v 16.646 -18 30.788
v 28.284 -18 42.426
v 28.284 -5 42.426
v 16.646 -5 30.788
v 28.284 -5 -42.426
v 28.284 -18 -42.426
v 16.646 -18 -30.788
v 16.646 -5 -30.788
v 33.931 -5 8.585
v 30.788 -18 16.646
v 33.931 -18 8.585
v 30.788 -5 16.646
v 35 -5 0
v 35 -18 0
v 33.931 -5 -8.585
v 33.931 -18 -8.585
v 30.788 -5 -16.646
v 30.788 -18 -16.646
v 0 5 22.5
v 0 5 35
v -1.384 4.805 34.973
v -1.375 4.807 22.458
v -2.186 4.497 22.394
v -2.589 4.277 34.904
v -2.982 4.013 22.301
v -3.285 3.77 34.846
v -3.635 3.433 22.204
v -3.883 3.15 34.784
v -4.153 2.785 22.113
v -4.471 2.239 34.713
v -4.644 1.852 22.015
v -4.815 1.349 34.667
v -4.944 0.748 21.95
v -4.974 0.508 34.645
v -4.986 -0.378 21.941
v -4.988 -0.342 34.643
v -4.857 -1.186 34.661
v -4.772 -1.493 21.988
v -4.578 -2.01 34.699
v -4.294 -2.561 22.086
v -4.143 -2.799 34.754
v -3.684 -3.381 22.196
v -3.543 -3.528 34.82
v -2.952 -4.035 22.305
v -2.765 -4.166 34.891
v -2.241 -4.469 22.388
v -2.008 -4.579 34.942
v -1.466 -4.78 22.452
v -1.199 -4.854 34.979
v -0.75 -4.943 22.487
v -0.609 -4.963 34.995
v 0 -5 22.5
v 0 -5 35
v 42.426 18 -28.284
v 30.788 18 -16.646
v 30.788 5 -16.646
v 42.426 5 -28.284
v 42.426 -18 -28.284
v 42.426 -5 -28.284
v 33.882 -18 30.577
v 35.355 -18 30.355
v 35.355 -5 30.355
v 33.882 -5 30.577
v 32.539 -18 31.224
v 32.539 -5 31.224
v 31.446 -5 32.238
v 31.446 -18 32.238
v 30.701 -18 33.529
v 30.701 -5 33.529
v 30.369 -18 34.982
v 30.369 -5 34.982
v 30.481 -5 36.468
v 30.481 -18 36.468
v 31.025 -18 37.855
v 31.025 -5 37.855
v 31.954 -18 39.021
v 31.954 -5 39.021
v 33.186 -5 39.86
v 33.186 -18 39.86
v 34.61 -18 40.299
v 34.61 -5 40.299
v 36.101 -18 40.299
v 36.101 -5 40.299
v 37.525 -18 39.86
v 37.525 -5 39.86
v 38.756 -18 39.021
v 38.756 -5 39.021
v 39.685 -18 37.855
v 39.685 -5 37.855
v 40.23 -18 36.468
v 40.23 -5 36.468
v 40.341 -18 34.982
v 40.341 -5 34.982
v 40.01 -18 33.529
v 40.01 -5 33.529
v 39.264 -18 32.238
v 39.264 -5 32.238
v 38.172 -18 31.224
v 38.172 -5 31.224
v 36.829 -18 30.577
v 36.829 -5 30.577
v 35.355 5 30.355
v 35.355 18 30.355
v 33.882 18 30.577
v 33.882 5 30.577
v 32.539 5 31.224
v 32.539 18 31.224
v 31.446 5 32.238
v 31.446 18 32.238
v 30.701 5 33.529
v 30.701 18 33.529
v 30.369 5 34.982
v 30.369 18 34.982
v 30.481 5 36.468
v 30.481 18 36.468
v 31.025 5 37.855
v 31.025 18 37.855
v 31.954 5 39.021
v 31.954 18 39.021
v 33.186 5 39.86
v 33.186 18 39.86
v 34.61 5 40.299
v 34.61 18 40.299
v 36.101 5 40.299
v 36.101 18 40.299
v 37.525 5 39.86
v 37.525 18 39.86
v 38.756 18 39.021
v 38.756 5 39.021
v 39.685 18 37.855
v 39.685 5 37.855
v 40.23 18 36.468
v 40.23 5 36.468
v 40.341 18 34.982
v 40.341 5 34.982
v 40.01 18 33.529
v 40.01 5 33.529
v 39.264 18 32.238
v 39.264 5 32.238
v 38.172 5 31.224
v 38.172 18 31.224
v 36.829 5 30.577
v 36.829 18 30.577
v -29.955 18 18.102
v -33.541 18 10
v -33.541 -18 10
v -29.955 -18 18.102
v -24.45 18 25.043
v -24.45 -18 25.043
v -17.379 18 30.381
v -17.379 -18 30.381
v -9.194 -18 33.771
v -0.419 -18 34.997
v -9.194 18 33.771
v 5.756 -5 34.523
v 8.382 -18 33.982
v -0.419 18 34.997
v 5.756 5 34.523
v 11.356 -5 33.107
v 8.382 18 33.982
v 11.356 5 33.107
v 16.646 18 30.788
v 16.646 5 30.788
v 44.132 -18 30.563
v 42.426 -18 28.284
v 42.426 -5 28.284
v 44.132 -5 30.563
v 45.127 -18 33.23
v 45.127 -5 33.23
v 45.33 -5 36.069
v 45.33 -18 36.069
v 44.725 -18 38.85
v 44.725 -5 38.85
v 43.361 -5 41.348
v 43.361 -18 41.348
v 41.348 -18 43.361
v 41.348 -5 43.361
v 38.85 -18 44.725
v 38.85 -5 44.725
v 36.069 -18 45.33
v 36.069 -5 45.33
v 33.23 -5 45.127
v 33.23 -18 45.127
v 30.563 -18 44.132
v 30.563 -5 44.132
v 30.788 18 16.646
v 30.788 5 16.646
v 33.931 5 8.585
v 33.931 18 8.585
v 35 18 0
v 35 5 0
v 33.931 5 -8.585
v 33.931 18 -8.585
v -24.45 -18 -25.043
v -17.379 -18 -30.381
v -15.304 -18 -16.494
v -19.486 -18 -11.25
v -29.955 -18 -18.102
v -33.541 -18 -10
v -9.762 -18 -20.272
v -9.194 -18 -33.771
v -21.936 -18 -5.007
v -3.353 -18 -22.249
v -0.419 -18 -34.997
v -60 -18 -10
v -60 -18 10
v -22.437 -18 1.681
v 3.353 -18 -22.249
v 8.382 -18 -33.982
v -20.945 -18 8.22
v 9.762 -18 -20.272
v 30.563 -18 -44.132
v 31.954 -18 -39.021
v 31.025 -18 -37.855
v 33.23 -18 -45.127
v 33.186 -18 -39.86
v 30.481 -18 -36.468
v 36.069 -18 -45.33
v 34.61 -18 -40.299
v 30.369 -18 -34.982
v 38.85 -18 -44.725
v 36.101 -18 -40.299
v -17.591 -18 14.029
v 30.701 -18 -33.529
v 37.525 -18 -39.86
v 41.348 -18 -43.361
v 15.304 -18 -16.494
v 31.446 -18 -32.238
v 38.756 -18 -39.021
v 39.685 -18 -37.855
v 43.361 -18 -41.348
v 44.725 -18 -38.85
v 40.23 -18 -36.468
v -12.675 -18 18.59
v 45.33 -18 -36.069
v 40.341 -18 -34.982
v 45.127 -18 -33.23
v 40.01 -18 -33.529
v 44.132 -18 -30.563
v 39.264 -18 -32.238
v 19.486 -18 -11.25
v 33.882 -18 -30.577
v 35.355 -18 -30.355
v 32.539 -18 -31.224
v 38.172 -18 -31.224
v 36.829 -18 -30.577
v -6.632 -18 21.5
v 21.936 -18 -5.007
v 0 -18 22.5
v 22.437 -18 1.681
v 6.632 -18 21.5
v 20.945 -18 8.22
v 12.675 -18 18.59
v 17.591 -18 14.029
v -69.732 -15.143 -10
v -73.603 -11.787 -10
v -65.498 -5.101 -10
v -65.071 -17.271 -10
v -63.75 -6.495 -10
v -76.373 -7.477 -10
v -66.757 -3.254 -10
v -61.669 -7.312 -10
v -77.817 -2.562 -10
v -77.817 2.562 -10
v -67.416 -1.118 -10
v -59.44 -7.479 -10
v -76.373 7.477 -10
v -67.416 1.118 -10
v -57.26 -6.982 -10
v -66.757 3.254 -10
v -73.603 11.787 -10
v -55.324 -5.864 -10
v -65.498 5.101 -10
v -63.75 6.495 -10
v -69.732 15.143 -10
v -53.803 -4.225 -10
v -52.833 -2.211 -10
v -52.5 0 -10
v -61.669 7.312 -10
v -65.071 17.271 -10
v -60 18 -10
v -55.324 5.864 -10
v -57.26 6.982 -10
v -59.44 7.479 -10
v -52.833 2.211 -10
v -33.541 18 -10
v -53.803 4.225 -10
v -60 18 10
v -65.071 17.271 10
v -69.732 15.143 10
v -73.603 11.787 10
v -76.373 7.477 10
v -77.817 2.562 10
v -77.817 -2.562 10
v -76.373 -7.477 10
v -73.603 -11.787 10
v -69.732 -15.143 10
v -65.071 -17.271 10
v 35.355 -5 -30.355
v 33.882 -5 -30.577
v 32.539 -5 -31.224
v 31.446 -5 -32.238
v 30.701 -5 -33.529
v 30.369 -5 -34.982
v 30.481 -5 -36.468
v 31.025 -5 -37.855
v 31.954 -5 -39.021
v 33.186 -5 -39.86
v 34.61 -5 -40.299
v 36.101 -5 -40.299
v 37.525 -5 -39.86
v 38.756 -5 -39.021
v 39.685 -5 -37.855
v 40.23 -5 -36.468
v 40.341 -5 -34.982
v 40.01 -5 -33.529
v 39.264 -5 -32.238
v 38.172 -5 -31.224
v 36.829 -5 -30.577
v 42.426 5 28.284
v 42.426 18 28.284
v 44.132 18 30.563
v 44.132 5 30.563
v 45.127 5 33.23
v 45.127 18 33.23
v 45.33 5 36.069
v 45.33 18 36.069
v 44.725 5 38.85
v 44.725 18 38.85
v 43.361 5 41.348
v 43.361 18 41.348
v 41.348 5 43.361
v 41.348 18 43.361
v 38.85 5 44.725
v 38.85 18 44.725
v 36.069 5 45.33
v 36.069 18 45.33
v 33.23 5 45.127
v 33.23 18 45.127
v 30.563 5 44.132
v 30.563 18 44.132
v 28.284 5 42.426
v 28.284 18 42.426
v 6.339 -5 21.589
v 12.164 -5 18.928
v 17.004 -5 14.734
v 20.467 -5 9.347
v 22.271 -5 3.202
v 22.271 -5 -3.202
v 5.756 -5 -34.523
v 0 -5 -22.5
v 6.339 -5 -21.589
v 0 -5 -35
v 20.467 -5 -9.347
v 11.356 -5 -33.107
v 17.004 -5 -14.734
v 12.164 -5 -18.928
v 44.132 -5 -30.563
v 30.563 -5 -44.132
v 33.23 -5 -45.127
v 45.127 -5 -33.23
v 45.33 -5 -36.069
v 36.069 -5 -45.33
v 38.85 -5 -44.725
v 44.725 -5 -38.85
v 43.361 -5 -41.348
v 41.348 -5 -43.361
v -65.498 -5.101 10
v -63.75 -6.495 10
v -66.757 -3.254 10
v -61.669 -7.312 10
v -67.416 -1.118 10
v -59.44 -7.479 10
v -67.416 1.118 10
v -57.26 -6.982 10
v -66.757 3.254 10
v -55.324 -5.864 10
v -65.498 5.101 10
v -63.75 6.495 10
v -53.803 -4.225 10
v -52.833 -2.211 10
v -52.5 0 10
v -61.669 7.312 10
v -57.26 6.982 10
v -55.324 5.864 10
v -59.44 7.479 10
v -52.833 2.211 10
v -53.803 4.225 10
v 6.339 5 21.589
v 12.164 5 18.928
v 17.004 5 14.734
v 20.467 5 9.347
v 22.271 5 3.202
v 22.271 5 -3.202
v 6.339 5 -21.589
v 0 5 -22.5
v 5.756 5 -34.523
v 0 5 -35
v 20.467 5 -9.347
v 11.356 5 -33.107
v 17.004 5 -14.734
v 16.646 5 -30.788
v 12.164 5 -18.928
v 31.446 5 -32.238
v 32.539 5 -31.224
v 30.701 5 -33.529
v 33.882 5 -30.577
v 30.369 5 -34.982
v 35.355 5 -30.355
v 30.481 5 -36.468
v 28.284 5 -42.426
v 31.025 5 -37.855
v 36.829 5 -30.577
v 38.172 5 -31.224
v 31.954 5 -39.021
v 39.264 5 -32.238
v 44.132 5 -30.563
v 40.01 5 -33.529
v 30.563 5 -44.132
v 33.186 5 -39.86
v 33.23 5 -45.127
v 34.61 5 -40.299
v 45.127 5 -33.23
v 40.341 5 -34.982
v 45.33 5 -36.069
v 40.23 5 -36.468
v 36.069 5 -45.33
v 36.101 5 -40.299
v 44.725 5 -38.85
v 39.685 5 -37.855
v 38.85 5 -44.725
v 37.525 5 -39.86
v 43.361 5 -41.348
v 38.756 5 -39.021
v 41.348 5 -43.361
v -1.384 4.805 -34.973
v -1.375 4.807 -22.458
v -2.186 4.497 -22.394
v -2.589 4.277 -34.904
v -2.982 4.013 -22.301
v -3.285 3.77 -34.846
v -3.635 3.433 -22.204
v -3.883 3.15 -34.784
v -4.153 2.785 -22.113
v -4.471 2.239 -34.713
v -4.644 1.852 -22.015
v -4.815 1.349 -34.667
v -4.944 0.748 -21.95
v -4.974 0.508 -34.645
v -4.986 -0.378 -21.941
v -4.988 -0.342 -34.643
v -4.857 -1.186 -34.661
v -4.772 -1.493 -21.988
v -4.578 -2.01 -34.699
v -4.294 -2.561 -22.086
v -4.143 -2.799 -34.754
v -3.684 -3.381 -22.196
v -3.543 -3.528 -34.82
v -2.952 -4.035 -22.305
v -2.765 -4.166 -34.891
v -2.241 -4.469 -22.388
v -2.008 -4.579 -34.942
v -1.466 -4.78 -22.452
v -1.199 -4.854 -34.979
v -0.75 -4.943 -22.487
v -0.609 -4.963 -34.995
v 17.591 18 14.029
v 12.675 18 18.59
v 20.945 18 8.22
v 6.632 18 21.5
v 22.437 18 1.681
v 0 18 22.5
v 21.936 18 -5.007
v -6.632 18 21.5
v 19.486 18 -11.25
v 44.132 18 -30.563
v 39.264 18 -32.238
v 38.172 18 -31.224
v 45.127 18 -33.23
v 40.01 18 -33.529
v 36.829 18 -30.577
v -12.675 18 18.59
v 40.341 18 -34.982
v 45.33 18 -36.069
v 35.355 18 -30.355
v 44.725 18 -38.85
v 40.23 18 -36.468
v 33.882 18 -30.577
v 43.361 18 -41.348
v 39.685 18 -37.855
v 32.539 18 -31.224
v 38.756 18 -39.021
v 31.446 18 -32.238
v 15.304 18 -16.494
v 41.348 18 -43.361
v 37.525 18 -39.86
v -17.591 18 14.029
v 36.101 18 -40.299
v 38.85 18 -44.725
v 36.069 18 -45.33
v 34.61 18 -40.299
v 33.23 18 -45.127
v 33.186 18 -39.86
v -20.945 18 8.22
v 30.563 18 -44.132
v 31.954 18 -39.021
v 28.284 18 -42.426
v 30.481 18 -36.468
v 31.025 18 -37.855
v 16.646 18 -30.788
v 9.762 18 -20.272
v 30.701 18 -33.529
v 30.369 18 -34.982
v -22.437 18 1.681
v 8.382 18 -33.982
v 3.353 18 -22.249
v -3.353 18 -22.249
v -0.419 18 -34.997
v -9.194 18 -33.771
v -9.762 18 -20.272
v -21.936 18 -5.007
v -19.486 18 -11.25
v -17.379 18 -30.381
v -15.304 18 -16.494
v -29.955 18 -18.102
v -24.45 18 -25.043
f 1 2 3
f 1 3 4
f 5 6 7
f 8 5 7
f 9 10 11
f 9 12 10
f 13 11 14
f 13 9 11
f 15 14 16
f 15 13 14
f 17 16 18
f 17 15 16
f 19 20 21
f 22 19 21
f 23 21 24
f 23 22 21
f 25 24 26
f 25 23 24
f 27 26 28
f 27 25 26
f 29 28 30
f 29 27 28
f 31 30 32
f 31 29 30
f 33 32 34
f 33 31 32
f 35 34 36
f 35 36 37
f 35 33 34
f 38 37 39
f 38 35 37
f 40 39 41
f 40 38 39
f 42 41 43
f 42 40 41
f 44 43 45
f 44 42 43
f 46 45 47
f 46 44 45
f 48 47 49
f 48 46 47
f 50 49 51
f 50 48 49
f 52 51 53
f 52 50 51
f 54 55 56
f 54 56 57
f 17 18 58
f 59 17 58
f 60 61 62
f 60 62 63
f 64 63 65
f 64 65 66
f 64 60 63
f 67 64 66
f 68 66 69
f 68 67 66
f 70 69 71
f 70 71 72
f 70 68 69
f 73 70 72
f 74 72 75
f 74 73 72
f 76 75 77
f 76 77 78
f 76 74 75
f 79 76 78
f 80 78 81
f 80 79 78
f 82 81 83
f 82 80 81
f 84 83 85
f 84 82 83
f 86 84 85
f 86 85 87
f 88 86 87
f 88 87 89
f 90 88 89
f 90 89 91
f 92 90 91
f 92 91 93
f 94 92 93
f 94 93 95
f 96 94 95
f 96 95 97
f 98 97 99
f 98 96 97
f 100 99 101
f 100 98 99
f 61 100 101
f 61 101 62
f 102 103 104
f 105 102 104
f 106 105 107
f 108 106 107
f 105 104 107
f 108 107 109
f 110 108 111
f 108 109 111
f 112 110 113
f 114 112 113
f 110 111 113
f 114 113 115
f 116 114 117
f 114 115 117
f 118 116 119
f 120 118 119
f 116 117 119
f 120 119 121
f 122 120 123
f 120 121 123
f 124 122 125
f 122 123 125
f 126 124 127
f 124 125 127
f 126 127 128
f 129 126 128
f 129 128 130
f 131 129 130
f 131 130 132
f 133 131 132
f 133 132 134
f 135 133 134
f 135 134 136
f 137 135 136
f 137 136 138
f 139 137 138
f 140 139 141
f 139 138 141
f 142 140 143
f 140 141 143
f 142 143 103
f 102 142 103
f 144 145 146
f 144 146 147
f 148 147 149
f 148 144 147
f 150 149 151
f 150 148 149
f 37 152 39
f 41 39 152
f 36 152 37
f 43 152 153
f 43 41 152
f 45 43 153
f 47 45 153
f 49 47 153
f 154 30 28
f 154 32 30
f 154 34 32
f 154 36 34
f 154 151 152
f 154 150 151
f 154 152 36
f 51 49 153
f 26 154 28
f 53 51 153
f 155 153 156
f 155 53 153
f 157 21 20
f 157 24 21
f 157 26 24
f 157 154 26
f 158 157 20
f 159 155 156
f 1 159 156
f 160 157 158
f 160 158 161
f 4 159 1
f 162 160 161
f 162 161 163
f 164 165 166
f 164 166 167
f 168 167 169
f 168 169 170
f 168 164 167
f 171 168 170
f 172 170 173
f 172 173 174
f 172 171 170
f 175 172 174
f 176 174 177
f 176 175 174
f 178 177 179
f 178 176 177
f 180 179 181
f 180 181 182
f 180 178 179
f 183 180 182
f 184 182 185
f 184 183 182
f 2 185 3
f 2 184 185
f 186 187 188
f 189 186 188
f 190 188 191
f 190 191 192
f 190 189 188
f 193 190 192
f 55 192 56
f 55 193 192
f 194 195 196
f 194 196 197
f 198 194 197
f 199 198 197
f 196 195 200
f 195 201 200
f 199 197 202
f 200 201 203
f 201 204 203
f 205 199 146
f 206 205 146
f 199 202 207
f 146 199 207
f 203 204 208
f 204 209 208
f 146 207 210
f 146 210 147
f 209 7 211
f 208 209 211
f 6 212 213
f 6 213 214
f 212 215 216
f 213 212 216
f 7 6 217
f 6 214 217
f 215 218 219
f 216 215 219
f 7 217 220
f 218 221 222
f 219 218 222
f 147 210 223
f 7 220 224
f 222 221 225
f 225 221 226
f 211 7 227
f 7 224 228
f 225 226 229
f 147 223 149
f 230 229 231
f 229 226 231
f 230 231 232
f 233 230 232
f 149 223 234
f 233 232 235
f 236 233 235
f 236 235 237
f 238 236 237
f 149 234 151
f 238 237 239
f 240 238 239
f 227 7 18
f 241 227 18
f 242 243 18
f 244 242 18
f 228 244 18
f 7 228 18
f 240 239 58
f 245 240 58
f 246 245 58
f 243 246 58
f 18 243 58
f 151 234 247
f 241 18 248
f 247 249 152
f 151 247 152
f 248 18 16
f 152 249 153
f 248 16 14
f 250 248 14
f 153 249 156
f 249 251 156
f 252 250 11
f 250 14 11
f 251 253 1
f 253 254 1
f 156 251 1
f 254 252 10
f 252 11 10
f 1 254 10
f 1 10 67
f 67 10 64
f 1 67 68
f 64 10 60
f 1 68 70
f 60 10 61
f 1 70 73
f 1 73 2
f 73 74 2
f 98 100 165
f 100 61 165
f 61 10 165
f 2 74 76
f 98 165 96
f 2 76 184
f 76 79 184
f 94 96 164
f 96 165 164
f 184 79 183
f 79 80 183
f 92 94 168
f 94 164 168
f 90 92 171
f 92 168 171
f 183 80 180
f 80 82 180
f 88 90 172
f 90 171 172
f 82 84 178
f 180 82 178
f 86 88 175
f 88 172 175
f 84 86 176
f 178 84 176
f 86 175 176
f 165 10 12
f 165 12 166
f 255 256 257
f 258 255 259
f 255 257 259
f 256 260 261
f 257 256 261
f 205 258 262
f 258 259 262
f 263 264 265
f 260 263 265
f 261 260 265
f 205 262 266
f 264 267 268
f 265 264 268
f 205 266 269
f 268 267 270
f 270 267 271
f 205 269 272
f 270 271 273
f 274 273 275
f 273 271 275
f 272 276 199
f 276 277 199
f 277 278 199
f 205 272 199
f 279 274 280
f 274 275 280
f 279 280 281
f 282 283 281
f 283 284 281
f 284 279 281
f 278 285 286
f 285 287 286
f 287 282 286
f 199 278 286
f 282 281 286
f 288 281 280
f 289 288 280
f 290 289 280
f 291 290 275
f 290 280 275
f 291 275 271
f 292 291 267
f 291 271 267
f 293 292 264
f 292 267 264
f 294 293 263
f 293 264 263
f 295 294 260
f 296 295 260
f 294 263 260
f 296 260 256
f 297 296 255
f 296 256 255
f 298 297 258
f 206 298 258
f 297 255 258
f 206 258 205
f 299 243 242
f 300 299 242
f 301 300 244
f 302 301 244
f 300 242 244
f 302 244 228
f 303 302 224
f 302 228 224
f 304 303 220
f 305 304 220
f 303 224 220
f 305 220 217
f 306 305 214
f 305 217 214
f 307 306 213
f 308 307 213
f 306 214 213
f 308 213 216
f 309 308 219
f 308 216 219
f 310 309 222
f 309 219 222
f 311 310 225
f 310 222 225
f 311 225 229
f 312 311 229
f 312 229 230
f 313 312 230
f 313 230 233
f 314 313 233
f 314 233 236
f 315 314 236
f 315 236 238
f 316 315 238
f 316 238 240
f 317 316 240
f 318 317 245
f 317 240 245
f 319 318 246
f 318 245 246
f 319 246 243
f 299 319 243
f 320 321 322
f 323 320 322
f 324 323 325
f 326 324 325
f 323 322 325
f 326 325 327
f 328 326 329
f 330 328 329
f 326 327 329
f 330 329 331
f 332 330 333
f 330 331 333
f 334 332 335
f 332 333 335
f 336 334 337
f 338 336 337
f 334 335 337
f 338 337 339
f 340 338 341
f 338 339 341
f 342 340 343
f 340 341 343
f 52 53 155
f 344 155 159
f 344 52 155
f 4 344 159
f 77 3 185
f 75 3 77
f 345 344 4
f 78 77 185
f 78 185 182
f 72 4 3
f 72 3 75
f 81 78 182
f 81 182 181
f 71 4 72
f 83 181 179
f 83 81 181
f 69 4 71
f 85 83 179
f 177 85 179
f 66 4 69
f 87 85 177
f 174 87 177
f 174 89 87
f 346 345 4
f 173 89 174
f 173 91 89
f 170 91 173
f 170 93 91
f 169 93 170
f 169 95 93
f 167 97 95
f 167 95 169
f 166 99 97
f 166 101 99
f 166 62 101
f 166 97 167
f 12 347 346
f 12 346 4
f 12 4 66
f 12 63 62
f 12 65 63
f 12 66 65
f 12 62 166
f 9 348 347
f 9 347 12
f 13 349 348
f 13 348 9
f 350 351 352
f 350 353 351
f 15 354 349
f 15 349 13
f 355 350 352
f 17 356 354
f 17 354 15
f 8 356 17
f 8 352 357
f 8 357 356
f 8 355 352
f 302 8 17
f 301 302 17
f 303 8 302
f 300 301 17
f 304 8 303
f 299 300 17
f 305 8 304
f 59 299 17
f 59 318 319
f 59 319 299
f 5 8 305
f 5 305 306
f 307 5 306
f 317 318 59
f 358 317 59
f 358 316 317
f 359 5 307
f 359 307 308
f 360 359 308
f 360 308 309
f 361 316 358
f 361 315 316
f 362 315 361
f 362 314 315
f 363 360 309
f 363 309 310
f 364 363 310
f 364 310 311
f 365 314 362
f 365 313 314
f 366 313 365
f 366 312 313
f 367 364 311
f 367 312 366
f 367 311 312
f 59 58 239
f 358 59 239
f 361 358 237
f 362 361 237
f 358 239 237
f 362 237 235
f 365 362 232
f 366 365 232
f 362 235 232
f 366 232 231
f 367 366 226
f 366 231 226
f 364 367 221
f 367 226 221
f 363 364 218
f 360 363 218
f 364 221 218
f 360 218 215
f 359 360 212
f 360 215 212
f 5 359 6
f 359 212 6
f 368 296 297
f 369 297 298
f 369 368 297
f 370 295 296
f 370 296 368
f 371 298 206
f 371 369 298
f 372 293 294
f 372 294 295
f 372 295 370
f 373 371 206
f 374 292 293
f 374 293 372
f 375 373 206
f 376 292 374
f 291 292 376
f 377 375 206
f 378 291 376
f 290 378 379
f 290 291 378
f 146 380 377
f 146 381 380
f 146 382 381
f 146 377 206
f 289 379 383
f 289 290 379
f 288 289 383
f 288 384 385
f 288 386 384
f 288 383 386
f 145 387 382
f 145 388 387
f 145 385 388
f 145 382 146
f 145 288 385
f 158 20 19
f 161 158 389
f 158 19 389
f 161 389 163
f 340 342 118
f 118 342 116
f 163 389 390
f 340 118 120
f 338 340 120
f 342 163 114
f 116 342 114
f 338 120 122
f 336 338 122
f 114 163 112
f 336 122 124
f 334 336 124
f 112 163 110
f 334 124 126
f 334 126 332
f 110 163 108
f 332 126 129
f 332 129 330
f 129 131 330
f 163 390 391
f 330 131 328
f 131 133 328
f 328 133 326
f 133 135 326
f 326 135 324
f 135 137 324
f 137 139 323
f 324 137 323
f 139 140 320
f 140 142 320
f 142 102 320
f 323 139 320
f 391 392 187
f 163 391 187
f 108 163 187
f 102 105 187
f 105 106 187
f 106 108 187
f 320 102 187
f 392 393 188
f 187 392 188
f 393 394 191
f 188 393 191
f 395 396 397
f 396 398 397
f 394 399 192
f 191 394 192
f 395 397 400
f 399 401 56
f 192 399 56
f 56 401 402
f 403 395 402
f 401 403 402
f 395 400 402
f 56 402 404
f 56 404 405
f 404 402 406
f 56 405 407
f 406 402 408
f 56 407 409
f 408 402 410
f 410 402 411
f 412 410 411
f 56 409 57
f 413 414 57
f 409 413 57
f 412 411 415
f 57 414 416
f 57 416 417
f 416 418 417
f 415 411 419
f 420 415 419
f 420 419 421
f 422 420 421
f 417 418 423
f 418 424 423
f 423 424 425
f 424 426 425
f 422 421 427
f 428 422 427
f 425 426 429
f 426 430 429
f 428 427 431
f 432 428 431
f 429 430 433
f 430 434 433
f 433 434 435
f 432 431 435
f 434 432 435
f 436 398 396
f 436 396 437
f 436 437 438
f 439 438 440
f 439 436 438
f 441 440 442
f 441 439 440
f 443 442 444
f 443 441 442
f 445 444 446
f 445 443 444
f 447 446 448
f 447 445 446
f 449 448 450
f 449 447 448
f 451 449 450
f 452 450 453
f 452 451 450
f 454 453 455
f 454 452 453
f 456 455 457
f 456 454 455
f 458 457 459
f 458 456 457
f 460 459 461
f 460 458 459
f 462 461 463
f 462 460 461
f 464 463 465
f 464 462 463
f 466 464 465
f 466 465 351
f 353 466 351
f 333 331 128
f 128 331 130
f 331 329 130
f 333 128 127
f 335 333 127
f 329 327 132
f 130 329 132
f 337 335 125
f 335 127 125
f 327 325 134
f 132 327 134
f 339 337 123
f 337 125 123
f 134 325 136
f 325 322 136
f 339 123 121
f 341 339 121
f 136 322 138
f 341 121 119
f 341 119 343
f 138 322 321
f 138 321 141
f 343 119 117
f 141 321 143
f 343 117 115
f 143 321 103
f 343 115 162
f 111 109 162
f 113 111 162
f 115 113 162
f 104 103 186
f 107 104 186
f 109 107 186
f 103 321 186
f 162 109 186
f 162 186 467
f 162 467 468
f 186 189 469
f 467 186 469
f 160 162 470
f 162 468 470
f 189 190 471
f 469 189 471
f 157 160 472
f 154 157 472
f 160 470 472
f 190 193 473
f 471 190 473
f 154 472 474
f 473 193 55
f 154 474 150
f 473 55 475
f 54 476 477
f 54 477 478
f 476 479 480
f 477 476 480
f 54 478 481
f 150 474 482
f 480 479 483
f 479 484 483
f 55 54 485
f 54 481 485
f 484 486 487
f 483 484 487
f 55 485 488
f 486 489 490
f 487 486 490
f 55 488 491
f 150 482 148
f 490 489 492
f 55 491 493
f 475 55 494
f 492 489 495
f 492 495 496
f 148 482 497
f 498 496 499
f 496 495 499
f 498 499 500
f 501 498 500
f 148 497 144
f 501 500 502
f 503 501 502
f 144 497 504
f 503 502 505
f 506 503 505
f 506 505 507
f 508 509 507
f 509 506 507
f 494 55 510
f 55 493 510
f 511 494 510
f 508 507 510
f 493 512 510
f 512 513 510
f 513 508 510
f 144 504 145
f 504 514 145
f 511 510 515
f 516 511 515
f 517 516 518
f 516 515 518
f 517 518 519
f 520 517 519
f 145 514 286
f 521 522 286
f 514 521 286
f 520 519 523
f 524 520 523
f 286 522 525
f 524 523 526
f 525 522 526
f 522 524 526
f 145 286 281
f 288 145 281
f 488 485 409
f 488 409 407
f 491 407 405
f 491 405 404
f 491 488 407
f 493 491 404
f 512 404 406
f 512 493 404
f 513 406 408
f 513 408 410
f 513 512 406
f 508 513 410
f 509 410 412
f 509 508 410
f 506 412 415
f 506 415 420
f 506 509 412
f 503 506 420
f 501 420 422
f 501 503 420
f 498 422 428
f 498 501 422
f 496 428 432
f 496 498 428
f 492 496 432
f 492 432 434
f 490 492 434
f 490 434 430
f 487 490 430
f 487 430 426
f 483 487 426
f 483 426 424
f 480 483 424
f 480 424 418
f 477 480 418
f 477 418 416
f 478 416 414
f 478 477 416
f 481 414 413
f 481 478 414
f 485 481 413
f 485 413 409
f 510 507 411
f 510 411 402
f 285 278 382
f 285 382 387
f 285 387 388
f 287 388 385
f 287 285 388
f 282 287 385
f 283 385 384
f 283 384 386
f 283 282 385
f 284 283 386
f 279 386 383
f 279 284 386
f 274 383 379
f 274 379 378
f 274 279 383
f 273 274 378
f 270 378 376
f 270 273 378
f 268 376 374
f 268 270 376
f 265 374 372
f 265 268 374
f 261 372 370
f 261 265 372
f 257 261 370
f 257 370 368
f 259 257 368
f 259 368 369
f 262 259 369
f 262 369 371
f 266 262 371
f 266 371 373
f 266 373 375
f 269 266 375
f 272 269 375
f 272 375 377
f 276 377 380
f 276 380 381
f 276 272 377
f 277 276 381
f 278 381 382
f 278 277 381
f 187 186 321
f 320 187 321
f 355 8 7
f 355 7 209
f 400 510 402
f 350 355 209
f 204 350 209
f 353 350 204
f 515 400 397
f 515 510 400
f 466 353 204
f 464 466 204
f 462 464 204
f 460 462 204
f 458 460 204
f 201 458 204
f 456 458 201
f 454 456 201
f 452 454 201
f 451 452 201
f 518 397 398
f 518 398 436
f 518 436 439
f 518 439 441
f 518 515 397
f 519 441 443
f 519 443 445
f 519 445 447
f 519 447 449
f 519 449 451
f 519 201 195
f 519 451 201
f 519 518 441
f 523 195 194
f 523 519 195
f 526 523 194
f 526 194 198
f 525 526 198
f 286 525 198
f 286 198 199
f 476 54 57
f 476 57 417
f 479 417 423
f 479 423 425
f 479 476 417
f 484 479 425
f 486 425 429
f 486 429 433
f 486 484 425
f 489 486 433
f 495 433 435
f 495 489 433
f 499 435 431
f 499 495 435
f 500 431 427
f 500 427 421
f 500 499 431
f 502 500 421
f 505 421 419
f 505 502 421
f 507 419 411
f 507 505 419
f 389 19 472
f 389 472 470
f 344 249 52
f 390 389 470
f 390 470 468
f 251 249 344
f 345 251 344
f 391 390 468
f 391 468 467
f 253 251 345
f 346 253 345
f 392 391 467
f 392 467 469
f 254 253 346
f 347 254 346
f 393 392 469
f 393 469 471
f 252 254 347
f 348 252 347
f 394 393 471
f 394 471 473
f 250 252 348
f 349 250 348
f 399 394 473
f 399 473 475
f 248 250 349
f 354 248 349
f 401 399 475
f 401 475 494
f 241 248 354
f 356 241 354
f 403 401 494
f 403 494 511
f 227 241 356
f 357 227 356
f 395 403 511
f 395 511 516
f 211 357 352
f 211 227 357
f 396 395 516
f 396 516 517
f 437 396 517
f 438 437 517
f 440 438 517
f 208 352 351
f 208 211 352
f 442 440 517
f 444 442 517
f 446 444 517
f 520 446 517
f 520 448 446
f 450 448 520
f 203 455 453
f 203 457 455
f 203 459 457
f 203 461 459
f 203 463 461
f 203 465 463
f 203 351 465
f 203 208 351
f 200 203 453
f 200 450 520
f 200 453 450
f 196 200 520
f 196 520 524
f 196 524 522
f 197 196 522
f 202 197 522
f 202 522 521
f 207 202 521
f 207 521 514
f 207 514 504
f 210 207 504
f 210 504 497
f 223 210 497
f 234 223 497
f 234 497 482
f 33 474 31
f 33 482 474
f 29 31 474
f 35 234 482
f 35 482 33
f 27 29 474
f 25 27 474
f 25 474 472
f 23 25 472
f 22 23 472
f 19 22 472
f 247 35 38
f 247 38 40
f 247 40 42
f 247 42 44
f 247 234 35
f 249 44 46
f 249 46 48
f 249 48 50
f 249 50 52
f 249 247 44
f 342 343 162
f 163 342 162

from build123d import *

# Parameters (mm, degrees)
SKETCH1_R               = 35
SKETCH1_R_2             = 22.5
BOSS_EXTRUDE1_DEPTH     = 18
CUT_EXTRUDE1_DEPTH      = 53.668776329
CUT_EXTRUDE1_DEPTH_BACK = 53.668776329
SKETCH2_R               = 5
SKETCH2_W               = 35
SKETCH2_H               = 10
BOSS_EXTRUDE2_START     = 18
SKETCH3_R               = 5
BOSS_EXTRUDE2_DEPTH     = 13
MIRROR2_START           = 18
MIRROR2_COPY_1_SKETCH_R = 5
MIRROR2_COPY_1_DEPTH    = 13
BOSS_EXTRUDE4_DEPTH     = 10


with BuildPart() as part:
    # Sketch1 → Boss-Extrude1 (new, symmetric)
    with BuildSketch(Plane(origin=(0, 0, 0), x_dir=(1, 0, 0), z_dir=(0, 1, 0))):
        Circle(SKETCH1_R)
        Circle(SKETCH1_R_2, mode=Mode.SUBTRACT)
    extrude(amount=BOSS_EXTRUDE1_DEPTH, both=True)

    # Sketch2 → Cut-Extrude1 (cut, two sides: drawn at the far end of the back side and taken through both)
    with BuildSketch(Plane.XY.offset(-CUT_EXTRUDE1_DEPTH_BACK)):
        Circle(SKETCH2_R)
        with Locations((17.5, 0)):
            Rectangle(SKETCH2_W, SKETCH2_H)
    extrude(amount=CUT_EXTRUDE1_DEPTH + CUT_EXTRUDE1_DEPTH_BACK, mode=Mode.SUBTRACT)

    # Sketch3 → Boss-Extrude2 (add)
    with BuildSketch(Plane(origin=(0, 0, 0), x_dir=(1, 0, 0), z_dir=(0, 1, 0)).offset(BOSS_EXTRUDE2_START)):
        with BuildLine():
            Line((28.284271247, -42.426406871), (16.646014639, -30.788150263))
            ThreePointArc((16.646014639, -30.788150263), (24.748737342, -24.748737342), (30.788150263, -16.646014639))
            Line((30.788150263, -16.646014639), (42.426406871, -28.284271247))
            ThreePointArc((42.426406871, -28.284271247), (42.426406871, -42.426406871), (28.284271247, -42.426406871))
        make_face()
        with Locations((35.355339059, -35.355339059)):
            Circle(SKETCH3_R, mode=Mode.SUBTRACT)
    boss_extrude2 = extrude(amount=-BOSS_EXTRUDE2_DEPTH)

    # Mirror1: Boss-Extrude2 across plane
    add(boss_extrude2.mirror(Plane.XY))

    # Mirror2: Boss-Extrude2 across plane
    add(boss_extrude2.mirror(Plane.ZX))

    # Mirror2 copy 1 sketch → Mirror2 copy 1 (add)
    with BuildSketch(Plane.XZ.offset(MIRROR2_START)):
        with BuildLine():
            Line((28.284271247, -42.426406871), (16.646014639, -30.788150263))
            ThreePointArc((16.646014639, -30.788150263), (24.748737342, -24.748737342), (30.788150263, -16.646014639))
            Line((30.788150263, -16.646014639), (42.426406871, -28.284271247))
            ThreePointArc((42.426406871, -28.284271247), (42.426406871, -42.426406871), (28.284271247, -42.426406871))
        make_face()
        with Locations((35.355339059, -35.355339059)):
            Circle(MIRROR2_COPY_1_SKETCH_R, mode=Mode.SUBTRACT)
    extrude(amount=-MIRROR2_COPY_1_DEPTH)

    # Sketch4 → Boss-Extrude4 (add, symmetric)
    with BuildSketch(Plane.XY):
        with BuildLine():
            Line((-22.5, 18), (-60, 18))
            ThreePointArc((-60, 18), (-78, 0), (-60, -18))
            Line((-60, -18), (-22.5, -18))
            Line((-22.5, -18), (-22.5, 18))
        make_face()
        with BuildLine():
            ThreePointArc((-67.5, 0), (-60, 7.5), (-52.5, 0))
            ThreePointArc((-52.5, 0), (-60, -7.5), (-67.5, 0))
        make_face(mode=Mode.SUBTRACT)
    extrude(amount=BOSS_EXTRUDE4_DEPTH, both=True)


solid = part.part
